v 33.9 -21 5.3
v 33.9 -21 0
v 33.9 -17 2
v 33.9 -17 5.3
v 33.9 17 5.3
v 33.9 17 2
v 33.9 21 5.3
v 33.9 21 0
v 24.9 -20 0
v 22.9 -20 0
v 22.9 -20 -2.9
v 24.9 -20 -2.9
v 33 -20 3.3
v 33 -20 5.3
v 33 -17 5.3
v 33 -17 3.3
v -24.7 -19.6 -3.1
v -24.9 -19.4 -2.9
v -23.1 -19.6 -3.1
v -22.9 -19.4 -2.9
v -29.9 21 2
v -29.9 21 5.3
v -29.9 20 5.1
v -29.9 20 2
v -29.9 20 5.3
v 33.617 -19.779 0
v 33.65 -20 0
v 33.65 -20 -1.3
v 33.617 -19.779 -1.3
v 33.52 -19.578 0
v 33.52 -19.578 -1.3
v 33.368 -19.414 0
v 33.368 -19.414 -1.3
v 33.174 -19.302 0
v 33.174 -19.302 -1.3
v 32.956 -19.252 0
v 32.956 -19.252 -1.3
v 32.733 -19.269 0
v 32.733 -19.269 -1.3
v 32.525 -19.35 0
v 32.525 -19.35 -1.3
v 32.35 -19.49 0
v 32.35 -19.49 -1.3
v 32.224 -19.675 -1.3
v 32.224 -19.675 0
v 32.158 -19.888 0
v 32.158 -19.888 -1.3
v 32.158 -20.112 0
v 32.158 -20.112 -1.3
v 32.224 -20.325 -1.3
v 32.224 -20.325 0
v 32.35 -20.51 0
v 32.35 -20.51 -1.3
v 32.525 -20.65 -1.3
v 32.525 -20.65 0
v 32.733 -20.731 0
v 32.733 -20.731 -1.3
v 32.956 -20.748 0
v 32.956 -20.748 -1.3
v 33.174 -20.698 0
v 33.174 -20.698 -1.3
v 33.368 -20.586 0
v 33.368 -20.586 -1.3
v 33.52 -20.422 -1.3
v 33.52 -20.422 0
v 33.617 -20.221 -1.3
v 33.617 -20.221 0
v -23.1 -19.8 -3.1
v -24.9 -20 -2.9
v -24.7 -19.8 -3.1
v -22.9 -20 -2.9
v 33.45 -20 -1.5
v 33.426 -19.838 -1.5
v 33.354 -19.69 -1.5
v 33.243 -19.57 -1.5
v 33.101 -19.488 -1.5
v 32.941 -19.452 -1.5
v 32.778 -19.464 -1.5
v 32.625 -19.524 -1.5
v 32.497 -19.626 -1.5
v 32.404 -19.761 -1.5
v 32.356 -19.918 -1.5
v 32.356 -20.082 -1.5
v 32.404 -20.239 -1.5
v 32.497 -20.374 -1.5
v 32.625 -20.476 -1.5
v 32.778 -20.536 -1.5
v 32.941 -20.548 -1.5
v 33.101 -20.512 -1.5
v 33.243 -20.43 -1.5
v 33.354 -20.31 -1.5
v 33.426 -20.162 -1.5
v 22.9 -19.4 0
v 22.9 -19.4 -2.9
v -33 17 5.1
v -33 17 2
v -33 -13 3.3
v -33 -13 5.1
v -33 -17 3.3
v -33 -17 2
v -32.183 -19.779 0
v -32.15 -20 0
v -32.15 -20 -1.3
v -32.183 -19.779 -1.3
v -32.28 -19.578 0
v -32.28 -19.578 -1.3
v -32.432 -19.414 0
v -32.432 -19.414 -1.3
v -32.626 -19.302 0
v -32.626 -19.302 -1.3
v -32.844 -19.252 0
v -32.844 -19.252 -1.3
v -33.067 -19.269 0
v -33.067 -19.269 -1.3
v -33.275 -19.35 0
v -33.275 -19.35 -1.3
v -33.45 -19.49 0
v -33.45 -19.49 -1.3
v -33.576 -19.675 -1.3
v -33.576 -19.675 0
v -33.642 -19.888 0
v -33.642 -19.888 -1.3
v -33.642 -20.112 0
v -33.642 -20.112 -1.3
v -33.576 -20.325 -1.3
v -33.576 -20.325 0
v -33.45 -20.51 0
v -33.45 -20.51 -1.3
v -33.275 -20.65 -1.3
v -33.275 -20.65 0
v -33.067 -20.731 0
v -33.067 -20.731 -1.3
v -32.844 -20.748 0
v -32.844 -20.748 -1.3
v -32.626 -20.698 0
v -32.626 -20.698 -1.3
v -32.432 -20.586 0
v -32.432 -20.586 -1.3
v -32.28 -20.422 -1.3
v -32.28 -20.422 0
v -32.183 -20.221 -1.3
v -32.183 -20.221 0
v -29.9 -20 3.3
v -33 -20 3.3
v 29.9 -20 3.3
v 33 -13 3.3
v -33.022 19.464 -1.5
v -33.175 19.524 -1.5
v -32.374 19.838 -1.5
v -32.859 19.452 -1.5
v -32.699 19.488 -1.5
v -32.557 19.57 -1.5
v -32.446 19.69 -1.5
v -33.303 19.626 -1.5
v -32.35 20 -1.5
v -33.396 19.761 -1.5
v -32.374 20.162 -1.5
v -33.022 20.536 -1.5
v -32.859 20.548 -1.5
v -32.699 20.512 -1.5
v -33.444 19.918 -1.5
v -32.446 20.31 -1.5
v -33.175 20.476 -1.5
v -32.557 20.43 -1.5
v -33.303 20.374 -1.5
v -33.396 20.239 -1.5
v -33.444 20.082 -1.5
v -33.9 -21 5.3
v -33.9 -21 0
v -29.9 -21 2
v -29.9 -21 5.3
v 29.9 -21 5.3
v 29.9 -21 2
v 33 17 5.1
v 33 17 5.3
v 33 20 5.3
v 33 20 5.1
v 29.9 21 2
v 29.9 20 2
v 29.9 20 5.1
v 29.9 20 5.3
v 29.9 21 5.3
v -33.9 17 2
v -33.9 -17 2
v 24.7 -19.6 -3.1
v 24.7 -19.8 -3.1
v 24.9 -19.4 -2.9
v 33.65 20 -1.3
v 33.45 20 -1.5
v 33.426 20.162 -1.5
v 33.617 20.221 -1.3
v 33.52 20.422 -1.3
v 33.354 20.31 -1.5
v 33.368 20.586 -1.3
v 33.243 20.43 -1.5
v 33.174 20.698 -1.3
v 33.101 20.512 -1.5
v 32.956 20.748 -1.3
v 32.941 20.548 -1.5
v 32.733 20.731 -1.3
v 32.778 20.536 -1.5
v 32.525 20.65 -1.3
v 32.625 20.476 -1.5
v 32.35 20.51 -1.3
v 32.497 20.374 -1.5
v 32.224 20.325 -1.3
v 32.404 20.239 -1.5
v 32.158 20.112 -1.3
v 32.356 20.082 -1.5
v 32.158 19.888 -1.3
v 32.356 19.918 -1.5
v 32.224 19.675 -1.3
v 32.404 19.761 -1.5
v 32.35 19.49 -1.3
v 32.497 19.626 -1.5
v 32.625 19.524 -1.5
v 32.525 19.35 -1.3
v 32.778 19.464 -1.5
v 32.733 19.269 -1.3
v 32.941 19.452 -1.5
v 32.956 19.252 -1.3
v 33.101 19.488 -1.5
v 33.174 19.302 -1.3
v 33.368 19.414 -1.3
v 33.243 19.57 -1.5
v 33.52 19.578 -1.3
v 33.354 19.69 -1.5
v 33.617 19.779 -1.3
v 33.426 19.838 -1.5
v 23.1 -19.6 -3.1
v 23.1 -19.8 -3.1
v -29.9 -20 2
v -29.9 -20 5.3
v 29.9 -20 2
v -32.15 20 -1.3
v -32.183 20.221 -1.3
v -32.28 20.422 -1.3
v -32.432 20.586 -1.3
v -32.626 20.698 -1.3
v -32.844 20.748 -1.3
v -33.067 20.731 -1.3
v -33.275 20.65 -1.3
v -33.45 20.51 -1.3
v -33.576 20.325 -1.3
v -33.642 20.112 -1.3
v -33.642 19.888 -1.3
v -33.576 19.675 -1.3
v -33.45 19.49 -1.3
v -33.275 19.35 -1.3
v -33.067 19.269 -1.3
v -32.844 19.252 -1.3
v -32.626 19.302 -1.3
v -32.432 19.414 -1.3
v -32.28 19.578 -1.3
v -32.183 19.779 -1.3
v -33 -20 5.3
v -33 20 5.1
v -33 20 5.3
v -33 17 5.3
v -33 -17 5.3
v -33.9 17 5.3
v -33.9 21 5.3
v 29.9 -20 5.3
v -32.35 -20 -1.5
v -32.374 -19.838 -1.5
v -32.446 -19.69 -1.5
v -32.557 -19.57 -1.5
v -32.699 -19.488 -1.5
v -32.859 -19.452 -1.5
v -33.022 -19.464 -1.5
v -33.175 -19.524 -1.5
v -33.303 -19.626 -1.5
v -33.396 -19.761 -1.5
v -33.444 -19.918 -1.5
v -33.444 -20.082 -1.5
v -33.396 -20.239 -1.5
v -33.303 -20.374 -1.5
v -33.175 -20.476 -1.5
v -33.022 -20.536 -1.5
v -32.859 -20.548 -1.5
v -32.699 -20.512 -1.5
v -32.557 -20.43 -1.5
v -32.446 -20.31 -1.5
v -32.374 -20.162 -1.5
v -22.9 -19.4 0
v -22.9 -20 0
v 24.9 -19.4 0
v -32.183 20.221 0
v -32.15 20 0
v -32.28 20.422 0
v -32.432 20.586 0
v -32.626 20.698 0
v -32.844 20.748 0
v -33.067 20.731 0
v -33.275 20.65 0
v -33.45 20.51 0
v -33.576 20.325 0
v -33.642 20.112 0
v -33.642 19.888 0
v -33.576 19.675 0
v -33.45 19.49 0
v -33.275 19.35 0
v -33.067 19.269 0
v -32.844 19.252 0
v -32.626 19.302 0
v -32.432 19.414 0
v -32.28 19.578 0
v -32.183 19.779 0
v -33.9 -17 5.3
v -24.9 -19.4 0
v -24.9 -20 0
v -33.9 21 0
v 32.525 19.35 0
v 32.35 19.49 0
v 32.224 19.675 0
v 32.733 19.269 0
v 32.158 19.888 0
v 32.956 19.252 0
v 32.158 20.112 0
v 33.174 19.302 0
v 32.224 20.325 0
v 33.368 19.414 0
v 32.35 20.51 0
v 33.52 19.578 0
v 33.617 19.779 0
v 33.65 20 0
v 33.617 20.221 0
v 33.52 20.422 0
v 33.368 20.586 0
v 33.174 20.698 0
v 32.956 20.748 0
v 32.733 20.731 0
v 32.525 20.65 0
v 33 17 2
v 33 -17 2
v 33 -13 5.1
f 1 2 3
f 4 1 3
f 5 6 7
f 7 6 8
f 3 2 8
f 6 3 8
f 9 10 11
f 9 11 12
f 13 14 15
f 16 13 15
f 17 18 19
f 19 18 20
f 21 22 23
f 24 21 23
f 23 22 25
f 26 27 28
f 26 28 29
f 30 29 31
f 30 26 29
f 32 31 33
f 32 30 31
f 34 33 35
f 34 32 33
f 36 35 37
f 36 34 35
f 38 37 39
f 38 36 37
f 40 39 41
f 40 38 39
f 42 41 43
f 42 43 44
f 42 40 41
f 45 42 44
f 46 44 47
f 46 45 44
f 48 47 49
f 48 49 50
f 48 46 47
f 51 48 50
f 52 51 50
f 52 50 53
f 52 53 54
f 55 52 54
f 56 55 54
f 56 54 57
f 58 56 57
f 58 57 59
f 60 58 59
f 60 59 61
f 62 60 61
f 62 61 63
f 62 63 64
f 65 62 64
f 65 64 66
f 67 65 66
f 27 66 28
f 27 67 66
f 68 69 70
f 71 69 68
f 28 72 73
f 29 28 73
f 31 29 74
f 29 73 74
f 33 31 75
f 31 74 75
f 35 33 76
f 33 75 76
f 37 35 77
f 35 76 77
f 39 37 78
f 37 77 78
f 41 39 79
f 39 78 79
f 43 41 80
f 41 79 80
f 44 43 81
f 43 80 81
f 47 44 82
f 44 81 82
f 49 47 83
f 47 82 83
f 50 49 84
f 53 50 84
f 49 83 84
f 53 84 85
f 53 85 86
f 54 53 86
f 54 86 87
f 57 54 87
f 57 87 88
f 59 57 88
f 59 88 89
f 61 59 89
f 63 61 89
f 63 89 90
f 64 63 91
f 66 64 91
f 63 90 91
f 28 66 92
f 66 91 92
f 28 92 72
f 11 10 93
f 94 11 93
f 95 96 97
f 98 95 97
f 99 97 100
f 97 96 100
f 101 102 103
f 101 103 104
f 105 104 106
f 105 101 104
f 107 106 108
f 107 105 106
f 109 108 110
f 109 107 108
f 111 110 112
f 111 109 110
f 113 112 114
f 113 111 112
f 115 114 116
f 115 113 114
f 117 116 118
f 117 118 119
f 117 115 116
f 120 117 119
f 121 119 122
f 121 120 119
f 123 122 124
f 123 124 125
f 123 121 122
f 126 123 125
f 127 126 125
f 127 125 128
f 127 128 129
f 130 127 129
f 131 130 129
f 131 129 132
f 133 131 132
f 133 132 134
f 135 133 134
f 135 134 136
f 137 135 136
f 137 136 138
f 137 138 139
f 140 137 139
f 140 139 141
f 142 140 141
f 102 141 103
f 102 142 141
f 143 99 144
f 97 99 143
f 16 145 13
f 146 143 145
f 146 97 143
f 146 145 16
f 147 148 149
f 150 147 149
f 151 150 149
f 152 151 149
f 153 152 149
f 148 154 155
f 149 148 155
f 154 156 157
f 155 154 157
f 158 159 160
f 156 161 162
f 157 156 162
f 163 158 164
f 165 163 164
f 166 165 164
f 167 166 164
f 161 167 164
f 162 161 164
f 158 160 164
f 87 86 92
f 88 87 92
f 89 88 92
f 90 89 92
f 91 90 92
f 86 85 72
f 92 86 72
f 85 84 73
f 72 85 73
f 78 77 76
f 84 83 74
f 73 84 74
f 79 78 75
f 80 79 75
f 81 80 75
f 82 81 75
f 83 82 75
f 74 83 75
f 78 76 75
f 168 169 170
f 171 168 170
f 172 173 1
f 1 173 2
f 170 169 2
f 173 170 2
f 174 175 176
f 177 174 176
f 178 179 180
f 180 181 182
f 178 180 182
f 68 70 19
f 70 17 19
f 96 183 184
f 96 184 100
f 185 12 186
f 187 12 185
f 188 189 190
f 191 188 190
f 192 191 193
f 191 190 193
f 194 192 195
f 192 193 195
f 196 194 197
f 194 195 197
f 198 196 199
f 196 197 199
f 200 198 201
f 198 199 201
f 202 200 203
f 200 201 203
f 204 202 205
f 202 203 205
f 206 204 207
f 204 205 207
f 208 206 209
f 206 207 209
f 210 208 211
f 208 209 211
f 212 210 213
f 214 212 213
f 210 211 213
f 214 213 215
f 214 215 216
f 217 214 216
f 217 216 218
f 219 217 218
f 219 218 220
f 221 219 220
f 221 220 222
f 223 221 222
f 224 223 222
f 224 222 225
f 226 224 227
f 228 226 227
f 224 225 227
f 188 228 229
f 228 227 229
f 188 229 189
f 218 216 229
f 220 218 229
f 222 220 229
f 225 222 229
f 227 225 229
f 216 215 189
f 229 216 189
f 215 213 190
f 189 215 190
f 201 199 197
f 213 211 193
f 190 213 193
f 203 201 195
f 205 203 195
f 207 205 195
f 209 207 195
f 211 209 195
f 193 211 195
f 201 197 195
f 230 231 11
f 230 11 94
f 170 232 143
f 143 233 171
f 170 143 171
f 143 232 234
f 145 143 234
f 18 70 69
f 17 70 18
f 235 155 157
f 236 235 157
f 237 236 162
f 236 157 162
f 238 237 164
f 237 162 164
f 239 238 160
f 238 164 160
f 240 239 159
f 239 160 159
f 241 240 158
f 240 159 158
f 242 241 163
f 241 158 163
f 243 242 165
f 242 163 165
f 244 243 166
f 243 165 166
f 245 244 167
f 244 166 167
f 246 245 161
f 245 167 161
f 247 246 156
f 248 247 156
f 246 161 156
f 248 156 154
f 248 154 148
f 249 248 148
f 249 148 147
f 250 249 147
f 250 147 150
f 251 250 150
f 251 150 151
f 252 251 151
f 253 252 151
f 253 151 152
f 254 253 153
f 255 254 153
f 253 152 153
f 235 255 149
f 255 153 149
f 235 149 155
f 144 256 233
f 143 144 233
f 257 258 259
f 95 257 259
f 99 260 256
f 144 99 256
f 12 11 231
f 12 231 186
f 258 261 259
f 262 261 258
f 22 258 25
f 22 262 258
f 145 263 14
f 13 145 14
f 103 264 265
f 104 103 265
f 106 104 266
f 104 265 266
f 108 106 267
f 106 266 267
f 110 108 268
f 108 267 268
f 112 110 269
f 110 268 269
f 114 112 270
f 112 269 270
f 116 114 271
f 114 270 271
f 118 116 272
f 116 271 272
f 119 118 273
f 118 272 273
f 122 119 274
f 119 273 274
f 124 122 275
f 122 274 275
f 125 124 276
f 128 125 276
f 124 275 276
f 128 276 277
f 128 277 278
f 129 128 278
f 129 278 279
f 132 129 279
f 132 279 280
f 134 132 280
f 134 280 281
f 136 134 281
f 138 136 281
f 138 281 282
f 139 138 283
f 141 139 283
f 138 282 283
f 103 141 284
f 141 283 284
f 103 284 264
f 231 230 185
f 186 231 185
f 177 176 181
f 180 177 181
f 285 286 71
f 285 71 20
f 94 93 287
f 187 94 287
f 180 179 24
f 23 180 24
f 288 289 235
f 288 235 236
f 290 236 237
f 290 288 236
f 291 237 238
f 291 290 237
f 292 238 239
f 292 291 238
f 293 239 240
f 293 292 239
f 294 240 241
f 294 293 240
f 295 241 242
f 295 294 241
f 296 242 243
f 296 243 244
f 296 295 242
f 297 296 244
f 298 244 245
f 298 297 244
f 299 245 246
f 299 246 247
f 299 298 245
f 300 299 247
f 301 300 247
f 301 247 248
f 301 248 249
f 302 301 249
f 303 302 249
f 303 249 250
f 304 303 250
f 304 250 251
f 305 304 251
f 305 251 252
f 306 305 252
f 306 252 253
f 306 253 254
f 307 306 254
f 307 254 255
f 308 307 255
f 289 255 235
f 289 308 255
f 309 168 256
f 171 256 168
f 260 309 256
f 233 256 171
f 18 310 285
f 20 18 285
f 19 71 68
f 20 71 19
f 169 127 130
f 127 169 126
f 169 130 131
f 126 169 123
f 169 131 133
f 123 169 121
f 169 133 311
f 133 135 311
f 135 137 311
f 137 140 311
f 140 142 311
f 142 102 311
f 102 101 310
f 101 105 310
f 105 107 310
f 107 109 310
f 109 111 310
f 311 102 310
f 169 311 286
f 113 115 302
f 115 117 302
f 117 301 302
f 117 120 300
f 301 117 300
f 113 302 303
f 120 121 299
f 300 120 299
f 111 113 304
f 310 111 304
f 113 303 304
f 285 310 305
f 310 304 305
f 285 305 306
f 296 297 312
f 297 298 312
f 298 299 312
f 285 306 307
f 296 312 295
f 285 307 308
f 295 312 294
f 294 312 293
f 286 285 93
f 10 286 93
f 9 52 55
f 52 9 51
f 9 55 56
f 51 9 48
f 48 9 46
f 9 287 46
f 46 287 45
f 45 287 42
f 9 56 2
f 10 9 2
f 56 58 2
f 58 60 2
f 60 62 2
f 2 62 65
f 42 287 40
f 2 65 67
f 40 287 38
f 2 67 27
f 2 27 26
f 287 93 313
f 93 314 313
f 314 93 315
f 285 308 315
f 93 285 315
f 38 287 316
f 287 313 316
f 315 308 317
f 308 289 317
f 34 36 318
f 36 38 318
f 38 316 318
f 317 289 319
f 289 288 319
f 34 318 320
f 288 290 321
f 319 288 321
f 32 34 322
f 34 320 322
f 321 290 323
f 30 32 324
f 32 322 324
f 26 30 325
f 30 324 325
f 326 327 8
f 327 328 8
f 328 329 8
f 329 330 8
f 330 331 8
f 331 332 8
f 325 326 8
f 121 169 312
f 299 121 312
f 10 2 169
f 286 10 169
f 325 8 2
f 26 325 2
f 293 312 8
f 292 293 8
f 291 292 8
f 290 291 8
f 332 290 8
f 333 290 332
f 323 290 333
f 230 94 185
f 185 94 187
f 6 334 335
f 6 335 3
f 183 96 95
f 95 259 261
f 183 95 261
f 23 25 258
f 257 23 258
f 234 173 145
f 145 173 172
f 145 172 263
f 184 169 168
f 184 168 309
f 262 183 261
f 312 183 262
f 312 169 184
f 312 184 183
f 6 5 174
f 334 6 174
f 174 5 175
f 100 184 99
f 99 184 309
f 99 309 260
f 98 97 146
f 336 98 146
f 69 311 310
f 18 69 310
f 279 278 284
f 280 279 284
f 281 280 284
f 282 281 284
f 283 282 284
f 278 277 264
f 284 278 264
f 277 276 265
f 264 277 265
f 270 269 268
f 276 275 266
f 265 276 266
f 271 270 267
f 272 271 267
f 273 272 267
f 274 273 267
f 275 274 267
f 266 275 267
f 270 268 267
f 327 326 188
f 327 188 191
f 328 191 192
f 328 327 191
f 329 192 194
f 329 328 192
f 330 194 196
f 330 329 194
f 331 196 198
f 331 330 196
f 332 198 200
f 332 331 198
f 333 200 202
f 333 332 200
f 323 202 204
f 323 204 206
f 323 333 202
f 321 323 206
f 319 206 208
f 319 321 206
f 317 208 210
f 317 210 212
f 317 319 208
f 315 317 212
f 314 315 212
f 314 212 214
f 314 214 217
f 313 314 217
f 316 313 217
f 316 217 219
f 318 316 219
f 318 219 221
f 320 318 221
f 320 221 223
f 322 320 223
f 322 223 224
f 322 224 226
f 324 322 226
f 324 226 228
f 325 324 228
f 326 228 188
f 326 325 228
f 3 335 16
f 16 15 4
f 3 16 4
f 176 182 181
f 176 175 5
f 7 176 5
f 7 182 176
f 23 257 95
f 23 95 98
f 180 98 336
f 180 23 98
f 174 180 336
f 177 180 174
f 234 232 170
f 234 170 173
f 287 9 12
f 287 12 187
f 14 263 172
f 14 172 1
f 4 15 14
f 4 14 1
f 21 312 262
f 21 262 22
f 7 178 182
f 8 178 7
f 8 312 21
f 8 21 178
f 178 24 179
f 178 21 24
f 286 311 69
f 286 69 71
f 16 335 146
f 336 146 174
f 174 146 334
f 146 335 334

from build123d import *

# Parameters (mm, degrees)
F0_W     = 67.8
F0_H     = 42
F0_R     = 0.75
F0_W_2   = 2
F0_H_2   = 0.6
F1_DEPTH = 5.3
F2_DEPTH = 1.5
F3_DEPTH = 3.1
F5_DEPTH = 3.3
F7_DEPTH = 1.3
F9_DEPTH = 1.8
F10_SIZE = 0.2


with BuildPart() as f1:
    # F0 (on Top) → F1 (new body)
    with BuildSketch(Plane.XY):
        Rectangle(F0_W, F0_H)
        with Locations((-32.9, -20)):
            Circle(F0_R, mode=Mode.SUBTRACT)
        with Locations((-23.9, -19.7)):
            Rectangle(F0_W_2, F0_H_2, mode=Mode.SUBTRACT)
        with Locations((23.9, -19.7)):
            Rectangle(F0_W_2, F0_H_2, mode=Mode.SUBTRACT)
        with Locations((32.9, -20)):
            Circle(F0_R, mode=Mode.SUBTRACT)
        with Locations((-32.9, 20)):
            Circle(F0_R, mode=Mode.SUBTRACT)
        with Locations((32.9, 20)):
            Circle(F0_R, mode=Mode.SUBTRACT)
        with Locations((32.9, 20)):
            Circle(F0_R)
        with Locations((32.9, -20)):
            Circle(F0_R)
        with Locations((-32.9, 20)):
            Circle(F0_R)
        with Locations((-32.9, -20)):
            Circle(F0_R)
        with Locations((-23.9, -19.7)):
            Rectangle(F0_W_2, F0_H_2)
        with Locations((23.9, -19.7)):
            Rectangle(F0_W_2, F0_H_2)
    extrude(amount=F1_DEPTH)

    # F0 (on Top) → F2 (join)
    with BuildSketch(Plane.XY):
        with Locations((-32.9, -20)):
            Circle(F0_R)
        with Locations((32.9, -20)):
            Circle(F0_R)
        with Locations((32.9, 20)):
            Circle(F0_R)
        with Locations((-32.9, 20)):
            Circle(F0_R)
    extrude(amount=-F2_DEPTH)

    # F0 (on Top) → F3 (join)
    with BuildSketch(Plane.XY):
        with Locations((-23.9, -19.7)):
            Rectangle(F0_W_2, F0_H_2)
        with Locations((23.9, -19.7)):
            Rectangle(F0_W_2, F0_H_2)
    extrude(amount=-F3_DEPTH)

    # F4 (on face) → F5 (cut)
    with BuildSketch(Plane.XY.offset(5.3)):
        Polygon((33, 17), (33, 20), (29.9, 20), (29.9, 21), (-29.9, 21), (-29.9, 20), (-33, 20), (-33, 17), (-33.9, 17), (-33.9, -17), (-33, -17), (-33, -20), (-29.9, -20), (-29.9, -21), (29.9, -21), (29.9, -20), (33, -20), (33, -17), (33.9, -17), (33.9, 17), align=None)
    extrude(amount=-F5_DEPTH, mode=Mode.SUBTRACT)

    # F6 (on face) → F7 (join)
    with BuildSketch(Plane.XY.offset(2)):
        Polygon((33, 17), (33, 20), (29.9, 20), (-29.9, 20), (-33, 20), (-33, 17), (-33, -17), (-33, -20), (-29.9, -20), (29.9, -20), (33, -20), (33, -17), align=None)
    extrude(amount=F7_DEPTH)

    # F8 (on face) → F9 (join)
    with BuildSketch(Plane.XY.offset(3.3)):
        Polygon((-29.9, 20), (-33, 20), (-33, 17), (-33, -13), (33, -13), (33, 17), (33, 20), (29.9, 20), align=None)
    extrude(amount=F9_DEPTH)

    # F10
    f10_edges = [f1.edges().sort_by_distance(p)[0] for p in [
        (-33.65, -20, -1.5),
        (-23.9, -20, -3.1),
        (-22.9, -19.7, -3.1),
        (-23.9, -19.4, -3.1),
        (-24.9, -19.7, -3.1),
        (23.9, -19.4, -3.1),
        (22.9, -19.7, -3.1),
        (23.9, -20, -3.1),
        (24.9, -19.7, -3.1),
        (32.15, -20, -1.5),
        (32.15, 20, -1.5),
        (-33.65, 20, -1.5),
    ]]
    chamfer(f10_edges, length=F10_SIZE)


solid = f1.part
